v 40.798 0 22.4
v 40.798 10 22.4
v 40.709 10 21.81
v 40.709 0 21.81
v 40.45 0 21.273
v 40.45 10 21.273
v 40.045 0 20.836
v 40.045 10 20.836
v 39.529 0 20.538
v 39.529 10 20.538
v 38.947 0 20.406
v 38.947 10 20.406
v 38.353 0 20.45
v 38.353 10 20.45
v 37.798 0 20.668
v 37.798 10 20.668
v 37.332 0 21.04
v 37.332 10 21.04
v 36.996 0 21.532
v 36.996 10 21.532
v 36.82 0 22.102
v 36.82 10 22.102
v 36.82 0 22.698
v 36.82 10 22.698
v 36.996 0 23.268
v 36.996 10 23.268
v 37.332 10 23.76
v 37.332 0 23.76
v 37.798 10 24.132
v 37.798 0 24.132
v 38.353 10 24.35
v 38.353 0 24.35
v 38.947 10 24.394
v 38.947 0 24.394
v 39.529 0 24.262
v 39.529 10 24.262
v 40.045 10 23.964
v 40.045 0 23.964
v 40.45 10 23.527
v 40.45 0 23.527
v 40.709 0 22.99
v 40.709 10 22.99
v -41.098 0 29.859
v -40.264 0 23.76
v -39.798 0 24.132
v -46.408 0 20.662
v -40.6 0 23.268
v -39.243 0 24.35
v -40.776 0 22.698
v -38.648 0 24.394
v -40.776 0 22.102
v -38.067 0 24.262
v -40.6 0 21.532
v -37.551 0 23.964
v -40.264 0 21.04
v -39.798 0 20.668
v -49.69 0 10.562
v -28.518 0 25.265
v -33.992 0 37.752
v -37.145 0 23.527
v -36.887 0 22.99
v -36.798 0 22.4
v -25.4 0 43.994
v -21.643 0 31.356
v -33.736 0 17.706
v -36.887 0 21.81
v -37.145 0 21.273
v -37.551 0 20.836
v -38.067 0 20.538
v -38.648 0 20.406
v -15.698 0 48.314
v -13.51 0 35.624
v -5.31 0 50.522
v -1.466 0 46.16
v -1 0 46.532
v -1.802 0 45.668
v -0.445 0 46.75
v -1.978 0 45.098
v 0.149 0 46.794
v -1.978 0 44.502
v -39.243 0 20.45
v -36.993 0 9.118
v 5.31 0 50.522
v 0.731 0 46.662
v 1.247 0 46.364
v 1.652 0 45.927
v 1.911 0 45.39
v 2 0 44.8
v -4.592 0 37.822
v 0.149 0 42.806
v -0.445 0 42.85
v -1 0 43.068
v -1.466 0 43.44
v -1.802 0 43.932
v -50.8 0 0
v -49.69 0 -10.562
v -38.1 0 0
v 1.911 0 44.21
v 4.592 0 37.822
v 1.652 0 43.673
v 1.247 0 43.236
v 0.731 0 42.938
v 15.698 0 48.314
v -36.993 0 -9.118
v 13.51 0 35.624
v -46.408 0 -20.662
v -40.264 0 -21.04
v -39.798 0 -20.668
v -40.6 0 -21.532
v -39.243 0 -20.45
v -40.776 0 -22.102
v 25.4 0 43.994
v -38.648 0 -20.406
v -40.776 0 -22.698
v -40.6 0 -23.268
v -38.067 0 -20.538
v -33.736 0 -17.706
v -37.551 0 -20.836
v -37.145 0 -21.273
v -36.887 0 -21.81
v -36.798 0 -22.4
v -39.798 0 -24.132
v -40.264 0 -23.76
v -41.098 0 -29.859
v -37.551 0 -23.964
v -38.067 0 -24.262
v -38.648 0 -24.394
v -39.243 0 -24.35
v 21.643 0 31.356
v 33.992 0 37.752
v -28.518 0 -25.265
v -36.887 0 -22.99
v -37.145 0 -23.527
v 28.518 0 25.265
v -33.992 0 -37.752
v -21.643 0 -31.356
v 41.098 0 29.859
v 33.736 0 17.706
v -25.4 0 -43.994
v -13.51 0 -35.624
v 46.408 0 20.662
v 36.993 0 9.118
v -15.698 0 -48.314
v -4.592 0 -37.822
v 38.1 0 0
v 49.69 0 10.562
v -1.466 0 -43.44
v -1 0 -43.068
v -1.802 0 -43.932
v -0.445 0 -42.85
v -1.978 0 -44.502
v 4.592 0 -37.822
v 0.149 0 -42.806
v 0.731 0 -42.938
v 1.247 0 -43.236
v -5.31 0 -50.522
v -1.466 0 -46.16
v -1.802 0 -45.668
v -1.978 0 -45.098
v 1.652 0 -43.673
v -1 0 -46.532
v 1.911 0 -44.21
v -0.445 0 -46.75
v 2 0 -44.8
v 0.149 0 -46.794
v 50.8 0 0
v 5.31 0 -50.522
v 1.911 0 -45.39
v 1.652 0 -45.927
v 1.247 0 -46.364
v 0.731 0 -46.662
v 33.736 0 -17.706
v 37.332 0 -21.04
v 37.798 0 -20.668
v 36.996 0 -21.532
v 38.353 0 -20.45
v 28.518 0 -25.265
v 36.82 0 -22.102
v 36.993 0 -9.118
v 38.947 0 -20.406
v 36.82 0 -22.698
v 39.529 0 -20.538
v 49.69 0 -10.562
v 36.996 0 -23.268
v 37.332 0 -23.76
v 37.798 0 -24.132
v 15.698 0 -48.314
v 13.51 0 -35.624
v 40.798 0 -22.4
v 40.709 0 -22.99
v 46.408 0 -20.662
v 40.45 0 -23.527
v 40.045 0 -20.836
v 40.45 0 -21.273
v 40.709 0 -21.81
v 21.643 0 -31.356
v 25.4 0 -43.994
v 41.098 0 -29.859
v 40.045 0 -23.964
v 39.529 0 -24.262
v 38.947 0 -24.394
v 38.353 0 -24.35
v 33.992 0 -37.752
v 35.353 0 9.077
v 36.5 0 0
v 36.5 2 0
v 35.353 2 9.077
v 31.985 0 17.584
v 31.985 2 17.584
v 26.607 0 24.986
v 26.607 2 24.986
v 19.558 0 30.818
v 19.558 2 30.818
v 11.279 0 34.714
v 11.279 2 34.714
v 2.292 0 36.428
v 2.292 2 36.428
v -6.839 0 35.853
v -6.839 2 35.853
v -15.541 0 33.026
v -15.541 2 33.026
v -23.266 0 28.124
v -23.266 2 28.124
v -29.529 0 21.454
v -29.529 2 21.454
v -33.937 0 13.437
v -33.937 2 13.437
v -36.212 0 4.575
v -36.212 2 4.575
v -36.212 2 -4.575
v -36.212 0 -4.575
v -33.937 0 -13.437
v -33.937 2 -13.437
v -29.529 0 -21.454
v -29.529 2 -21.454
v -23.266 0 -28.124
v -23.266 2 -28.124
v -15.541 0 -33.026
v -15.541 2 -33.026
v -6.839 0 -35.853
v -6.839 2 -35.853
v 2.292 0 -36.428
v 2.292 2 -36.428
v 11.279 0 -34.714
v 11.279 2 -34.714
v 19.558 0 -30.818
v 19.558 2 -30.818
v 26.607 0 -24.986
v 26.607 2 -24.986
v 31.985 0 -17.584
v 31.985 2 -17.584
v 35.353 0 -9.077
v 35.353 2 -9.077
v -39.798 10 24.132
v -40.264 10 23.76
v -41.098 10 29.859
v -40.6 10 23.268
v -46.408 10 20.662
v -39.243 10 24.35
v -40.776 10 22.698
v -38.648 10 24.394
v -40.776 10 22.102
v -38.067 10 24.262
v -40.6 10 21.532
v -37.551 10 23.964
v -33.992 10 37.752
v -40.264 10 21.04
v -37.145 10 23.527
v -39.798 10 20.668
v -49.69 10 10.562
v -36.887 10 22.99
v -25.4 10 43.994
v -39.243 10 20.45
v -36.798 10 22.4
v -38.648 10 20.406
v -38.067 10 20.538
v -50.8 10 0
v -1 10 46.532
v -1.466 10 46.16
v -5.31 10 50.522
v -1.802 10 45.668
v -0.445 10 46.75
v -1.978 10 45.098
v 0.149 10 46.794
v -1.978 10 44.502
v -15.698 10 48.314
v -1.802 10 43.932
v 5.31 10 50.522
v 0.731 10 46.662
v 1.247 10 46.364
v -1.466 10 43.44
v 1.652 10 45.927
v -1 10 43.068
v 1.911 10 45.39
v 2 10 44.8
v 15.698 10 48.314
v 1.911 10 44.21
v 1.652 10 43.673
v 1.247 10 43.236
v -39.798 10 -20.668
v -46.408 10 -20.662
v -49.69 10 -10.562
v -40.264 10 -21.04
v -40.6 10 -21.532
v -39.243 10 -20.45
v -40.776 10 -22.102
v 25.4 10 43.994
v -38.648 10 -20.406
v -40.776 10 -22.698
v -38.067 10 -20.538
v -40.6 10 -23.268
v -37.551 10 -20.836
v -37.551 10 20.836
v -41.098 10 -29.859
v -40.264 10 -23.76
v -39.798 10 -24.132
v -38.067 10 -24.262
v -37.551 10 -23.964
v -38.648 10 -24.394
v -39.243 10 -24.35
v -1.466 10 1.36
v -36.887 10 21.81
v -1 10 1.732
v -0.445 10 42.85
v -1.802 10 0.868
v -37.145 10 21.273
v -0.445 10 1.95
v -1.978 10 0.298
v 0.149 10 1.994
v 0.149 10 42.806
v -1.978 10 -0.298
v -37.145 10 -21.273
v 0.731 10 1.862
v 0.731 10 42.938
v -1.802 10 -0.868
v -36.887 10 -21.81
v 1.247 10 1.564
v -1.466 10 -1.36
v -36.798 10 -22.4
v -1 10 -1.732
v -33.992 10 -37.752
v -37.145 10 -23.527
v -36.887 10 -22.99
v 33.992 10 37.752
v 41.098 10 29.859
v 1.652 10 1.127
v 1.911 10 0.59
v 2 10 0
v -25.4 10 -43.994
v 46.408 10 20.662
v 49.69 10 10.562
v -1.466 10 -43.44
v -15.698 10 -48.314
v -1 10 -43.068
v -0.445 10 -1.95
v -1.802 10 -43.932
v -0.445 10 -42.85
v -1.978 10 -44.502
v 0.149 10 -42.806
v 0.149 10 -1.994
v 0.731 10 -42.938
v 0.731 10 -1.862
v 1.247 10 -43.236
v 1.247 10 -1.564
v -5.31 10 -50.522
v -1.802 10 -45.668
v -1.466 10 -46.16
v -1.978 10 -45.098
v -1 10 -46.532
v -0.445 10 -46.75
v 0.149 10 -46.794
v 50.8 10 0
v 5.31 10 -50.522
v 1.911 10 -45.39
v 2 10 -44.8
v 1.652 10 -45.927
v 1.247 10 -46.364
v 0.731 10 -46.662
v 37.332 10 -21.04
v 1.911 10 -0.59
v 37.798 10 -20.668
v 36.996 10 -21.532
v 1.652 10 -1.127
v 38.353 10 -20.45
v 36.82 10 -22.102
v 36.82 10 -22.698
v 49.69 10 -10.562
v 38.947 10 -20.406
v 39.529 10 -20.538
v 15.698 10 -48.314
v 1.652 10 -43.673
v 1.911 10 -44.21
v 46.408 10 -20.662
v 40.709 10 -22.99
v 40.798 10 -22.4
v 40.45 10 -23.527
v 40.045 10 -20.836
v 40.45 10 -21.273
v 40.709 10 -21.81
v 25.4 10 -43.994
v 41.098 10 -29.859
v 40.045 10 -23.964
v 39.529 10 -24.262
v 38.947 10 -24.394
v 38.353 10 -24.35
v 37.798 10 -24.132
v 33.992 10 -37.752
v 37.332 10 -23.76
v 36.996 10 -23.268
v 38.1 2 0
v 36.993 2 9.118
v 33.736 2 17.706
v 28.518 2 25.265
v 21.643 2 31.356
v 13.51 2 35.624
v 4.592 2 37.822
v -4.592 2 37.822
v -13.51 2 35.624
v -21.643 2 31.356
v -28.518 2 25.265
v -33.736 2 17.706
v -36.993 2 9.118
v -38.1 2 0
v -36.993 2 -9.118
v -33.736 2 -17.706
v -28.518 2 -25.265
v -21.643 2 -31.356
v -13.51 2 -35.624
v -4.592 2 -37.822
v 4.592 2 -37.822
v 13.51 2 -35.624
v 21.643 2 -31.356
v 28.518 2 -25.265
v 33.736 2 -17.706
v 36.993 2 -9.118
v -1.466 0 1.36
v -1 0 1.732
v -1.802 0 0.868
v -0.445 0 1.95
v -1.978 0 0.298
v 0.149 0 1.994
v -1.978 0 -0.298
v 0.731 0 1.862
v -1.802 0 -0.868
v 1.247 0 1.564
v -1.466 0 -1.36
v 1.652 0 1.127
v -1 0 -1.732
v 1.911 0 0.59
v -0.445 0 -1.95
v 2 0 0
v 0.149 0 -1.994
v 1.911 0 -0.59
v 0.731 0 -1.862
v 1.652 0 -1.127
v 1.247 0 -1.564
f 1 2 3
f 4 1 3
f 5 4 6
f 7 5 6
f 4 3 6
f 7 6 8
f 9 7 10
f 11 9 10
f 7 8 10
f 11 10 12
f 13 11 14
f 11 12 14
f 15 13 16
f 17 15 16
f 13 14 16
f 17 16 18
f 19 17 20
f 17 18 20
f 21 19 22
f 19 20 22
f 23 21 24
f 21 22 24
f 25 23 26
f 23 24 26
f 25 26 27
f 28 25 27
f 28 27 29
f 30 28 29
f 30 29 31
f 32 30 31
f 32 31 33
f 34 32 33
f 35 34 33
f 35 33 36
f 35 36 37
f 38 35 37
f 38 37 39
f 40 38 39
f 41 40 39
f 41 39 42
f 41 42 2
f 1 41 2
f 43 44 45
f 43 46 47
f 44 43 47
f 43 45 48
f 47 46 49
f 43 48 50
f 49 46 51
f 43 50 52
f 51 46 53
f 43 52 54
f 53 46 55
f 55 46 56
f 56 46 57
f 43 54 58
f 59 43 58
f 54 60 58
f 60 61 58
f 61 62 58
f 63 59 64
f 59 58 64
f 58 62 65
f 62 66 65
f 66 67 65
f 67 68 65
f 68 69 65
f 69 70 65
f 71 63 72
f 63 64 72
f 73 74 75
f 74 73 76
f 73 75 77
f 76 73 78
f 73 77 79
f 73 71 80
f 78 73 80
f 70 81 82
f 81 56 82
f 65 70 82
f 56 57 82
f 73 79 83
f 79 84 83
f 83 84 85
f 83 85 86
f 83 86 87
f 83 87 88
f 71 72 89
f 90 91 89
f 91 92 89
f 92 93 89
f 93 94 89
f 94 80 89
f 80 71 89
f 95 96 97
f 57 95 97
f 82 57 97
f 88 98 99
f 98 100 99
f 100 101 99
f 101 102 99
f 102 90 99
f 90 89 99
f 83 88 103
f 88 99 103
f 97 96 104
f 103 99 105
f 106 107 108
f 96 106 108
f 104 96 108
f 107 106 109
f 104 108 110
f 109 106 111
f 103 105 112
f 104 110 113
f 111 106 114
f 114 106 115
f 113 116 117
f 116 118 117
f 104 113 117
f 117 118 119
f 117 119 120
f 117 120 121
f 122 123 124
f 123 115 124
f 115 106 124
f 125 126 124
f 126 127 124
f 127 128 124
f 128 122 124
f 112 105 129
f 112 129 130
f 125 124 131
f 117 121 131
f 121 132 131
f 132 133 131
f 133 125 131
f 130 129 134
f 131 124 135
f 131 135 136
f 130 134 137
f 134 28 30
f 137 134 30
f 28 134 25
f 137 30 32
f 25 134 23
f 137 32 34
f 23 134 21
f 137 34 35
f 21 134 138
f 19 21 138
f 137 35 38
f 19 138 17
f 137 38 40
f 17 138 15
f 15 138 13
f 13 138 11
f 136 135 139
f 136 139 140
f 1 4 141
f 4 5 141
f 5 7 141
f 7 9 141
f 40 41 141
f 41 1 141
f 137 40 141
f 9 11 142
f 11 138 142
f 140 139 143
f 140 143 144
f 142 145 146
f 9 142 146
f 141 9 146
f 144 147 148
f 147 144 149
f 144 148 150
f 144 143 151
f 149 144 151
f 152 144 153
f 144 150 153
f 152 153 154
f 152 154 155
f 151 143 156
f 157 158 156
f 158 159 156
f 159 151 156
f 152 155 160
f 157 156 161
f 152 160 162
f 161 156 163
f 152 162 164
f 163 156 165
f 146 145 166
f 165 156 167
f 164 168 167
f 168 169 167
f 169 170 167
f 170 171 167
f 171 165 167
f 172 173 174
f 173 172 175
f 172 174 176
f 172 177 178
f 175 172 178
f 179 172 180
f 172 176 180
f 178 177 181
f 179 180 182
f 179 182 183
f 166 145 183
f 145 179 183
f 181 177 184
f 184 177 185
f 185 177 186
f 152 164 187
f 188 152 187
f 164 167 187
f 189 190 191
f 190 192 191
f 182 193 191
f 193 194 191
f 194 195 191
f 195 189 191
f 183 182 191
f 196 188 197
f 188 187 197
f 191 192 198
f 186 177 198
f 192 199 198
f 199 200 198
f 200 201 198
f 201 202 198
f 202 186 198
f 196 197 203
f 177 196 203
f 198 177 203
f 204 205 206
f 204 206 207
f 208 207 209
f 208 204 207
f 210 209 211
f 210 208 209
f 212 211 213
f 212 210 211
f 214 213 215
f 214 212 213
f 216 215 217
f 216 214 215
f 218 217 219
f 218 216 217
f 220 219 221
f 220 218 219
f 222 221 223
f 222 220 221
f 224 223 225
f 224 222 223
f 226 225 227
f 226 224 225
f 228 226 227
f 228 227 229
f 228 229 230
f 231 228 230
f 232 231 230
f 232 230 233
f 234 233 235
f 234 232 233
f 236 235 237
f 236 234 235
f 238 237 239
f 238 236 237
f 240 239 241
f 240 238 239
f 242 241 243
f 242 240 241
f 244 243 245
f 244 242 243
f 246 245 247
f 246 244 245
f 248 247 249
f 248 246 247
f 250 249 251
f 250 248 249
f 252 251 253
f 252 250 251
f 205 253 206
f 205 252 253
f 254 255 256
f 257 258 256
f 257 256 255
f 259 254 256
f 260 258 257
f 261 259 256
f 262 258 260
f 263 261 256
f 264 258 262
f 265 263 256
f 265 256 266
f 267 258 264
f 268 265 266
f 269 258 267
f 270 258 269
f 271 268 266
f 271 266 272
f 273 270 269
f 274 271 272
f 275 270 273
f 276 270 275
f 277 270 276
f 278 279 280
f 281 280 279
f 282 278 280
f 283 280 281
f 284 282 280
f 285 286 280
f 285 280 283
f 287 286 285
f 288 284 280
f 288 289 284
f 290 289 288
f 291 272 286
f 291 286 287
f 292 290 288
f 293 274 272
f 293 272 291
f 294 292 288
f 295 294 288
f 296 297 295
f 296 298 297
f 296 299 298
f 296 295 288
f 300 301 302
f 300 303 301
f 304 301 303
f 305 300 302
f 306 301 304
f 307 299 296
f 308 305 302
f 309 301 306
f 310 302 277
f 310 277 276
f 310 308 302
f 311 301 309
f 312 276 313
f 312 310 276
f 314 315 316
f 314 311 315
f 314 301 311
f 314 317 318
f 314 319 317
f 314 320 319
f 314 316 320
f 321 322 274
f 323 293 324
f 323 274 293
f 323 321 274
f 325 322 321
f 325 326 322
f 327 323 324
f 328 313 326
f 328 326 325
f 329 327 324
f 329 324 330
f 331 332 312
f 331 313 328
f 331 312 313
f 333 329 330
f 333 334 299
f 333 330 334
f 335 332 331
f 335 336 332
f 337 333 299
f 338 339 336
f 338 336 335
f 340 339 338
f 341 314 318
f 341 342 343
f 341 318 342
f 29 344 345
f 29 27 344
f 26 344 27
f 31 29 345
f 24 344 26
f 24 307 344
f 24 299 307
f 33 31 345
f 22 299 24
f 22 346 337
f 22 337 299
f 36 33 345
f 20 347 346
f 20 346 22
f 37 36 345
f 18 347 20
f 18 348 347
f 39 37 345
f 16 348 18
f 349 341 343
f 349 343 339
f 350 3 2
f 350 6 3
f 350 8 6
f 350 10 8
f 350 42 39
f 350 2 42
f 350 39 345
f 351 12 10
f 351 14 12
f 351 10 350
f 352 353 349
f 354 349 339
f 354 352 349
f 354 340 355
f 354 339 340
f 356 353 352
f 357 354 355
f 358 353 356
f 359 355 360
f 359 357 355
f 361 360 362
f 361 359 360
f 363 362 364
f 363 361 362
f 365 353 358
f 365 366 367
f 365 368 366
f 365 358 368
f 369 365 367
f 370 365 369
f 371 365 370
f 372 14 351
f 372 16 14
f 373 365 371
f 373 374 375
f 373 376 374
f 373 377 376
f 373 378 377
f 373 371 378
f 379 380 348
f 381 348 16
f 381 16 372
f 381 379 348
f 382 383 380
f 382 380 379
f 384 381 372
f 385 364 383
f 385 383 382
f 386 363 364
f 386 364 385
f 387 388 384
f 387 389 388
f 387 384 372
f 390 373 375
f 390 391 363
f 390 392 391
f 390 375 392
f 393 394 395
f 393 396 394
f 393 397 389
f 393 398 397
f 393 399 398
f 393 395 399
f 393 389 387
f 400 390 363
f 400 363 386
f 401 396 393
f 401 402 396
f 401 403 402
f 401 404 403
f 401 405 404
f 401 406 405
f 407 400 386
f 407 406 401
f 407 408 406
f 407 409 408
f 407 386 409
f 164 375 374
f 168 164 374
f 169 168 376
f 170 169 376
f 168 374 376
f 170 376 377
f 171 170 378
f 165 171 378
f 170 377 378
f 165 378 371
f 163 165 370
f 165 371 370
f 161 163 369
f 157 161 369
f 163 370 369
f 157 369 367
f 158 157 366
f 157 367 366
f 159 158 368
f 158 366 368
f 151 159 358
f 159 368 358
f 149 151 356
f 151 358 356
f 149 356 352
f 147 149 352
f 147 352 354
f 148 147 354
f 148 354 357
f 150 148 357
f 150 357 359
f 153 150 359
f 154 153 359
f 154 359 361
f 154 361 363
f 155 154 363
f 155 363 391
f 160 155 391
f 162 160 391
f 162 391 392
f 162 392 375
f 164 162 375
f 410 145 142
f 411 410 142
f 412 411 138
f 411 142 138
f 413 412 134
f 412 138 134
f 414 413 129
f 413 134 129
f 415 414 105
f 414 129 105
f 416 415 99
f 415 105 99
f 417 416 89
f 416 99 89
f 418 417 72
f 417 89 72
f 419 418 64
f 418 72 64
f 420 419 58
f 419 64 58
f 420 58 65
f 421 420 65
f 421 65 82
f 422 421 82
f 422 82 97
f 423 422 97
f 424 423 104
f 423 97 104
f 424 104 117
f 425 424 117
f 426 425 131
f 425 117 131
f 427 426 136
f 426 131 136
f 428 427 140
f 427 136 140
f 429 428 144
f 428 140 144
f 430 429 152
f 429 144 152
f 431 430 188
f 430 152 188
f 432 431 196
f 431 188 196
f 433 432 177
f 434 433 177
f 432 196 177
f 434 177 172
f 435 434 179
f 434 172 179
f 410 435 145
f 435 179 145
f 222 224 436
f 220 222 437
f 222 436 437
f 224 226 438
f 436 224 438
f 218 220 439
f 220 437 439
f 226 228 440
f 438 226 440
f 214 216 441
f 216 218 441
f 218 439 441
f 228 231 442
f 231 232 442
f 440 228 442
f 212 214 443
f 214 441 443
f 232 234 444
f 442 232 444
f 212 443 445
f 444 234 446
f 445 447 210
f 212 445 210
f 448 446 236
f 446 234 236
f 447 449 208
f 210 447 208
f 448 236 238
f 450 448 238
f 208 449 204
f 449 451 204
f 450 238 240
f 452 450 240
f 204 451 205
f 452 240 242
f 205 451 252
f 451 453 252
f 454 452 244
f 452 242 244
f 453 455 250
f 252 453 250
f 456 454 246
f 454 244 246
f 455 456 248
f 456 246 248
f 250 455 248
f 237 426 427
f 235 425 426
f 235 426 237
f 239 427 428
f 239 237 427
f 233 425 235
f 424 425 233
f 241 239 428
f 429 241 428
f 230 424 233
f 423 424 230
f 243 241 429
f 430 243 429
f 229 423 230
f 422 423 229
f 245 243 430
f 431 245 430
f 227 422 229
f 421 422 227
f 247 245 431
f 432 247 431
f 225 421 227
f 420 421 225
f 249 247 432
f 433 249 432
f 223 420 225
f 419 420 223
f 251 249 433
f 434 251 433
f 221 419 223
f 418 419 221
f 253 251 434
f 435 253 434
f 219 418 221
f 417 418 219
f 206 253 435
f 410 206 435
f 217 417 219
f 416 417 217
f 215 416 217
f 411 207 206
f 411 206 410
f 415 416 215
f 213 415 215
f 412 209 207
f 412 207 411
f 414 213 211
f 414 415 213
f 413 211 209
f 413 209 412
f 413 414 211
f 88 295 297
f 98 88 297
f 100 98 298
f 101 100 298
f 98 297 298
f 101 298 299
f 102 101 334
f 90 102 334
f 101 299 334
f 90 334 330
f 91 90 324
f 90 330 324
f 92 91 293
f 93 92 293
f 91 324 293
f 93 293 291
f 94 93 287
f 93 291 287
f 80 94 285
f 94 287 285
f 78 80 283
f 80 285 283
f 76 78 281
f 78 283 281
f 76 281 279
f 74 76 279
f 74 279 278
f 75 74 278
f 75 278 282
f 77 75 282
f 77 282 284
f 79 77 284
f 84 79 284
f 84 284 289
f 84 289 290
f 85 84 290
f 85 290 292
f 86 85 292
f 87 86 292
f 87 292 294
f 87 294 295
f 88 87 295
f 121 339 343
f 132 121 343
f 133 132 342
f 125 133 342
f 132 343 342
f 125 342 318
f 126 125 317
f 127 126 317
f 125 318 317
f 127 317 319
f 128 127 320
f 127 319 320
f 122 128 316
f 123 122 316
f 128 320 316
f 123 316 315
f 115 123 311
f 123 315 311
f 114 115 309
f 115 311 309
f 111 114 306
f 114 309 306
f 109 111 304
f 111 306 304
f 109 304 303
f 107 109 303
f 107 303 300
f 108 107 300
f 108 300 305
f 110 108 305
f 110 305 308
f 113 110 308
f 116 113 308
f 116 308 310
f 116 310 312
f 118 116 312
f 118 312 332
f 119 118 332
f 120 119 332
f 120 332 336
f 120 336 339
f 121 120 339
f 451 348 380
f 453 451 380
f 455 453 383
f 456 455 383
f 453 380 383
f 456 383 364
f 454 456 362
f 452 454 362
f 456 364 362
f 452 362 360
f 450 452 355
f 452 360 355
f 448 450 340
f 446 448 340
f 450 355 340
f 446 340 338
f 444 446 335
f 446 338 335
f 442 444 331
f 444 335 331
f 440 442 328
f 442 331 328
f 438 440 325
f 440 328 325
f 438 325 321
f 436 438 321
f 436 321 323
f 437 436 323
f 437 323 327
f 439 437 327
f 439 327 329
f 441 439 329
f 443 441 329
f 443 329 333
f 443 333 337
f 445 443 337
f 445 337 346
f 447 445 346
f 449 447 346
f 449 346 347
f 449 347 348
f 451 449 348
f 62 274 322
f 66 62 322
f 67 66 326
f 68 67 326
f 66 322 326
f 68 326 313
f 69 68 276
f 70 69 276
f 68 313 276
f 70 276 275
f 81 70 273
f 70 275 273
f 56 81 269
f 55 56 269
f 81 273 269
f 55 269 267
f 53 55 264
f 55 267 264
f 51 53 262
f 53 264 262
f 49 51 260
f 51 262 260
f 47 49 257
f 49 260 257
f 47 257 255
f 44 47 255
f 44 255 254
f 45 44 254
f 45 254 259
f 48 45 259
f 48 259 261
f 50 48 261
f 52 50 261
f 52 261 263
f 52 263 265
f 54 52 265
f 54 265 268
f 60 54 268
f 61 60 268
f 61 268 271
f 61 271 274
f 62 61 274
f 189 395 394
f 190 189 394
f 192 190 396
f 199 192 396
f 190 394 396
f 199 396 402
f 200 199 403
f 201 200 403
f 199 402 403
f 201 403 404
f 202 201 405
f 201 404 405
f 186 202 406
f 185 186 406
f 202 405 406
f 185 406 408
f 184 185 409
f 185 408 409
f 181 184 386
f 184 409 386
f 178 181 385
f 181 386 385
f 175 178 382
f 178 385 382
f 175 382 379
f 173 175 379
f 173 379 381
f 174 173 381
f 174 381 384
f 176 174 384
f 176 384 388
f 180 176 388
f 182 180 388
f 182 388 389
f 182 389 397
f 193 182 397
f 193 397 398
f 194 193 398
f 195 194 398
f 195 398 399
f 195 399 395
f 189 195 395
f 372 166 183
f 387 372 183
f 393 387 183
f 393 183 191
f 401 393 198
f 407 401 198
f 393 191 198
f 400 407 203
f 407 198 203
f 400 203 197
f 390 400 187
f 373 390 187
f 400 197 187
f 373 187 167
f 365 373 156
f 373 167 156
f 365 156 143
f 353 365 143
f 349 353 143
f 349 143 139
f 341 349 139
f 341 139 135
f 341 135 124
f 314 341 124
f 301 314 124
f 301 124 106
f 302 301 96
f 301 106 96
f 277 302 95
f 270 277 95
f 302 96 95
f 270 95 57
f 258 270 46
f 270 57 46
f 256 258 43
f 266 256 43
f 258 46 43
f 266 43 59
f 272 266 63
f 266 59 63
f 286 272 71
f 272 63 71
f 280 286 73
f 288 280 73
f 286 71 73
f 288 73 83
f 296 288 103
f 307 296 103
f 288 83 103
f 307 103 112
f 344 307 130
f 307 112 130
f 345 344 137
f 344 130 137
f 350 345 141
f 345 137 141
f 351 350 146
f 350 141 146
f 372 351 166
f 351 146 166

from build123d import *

# Parameters (mm, degrees)
SKETCH1_R           = 50.8
BOSS_EXTRUDE1_DEPTH = 10
SKETCH2_R           = 38.1
SKETCH2_R_2         = 36.5
CUT_EXTRUDE1_DEPTH  = 2
SKETCH3_R           = 2
CUT_EXTRUDE2_DEPTH  = 14


with BuildPart() as part:
    # Sketch1 → Boss-Extrude1 (new body)
    with BuildSketch(Plane(origin=(0, 0, 0), x_dir=(1, 0, 0), z_dir=(0, 1, 0))):
        Circle(SKETCH1_R)
    extrude(amount=BOSS_EXTRUDE1_DEPTH)

    # Sketch2 → Cut-Extrude1 (cut)
    with BuildSketch(Plane.XZ):
        Circle(SKETCH2_R)
        Circle(SKETCH2_R_2, mode=Mode.SUBTRACT)
    extrude(amount=-CUT_EXTRUDE1_DEPTH, mode=Mode.SUBTRACT)

    # Sketch3 → Cut-Extrude2 (cut)
    with BuildSketch(Plane(origin=(0, 10, 0), x_dir=(1, 0, 0), z_dir=(0, 1, 0))):
        Circle(SKETCH3_R)
        with Locations((0, 44.8)):
            Circle(SKETCH3_R)
        with Locations((38.79793809, 22.4)):
            Circle(SKETCH3_R)
        with Locations((38.79793809, -22.4)):
            Circle(SKETCH3_R)
        with Locations((0, -44.8)):
            Circle(SKETCH3_R)
        with Locations((-38.79793809, -22.4)):
            Circle(SKETCH3_R)
        with Locations((-38.79793809, 22.4)):
            Circle(SKETCH3_R)
    extrude(amount=-CUT_EXTRUDE2_DEPTH, mode=Mode.SUBTRACT)


solid = part.part
